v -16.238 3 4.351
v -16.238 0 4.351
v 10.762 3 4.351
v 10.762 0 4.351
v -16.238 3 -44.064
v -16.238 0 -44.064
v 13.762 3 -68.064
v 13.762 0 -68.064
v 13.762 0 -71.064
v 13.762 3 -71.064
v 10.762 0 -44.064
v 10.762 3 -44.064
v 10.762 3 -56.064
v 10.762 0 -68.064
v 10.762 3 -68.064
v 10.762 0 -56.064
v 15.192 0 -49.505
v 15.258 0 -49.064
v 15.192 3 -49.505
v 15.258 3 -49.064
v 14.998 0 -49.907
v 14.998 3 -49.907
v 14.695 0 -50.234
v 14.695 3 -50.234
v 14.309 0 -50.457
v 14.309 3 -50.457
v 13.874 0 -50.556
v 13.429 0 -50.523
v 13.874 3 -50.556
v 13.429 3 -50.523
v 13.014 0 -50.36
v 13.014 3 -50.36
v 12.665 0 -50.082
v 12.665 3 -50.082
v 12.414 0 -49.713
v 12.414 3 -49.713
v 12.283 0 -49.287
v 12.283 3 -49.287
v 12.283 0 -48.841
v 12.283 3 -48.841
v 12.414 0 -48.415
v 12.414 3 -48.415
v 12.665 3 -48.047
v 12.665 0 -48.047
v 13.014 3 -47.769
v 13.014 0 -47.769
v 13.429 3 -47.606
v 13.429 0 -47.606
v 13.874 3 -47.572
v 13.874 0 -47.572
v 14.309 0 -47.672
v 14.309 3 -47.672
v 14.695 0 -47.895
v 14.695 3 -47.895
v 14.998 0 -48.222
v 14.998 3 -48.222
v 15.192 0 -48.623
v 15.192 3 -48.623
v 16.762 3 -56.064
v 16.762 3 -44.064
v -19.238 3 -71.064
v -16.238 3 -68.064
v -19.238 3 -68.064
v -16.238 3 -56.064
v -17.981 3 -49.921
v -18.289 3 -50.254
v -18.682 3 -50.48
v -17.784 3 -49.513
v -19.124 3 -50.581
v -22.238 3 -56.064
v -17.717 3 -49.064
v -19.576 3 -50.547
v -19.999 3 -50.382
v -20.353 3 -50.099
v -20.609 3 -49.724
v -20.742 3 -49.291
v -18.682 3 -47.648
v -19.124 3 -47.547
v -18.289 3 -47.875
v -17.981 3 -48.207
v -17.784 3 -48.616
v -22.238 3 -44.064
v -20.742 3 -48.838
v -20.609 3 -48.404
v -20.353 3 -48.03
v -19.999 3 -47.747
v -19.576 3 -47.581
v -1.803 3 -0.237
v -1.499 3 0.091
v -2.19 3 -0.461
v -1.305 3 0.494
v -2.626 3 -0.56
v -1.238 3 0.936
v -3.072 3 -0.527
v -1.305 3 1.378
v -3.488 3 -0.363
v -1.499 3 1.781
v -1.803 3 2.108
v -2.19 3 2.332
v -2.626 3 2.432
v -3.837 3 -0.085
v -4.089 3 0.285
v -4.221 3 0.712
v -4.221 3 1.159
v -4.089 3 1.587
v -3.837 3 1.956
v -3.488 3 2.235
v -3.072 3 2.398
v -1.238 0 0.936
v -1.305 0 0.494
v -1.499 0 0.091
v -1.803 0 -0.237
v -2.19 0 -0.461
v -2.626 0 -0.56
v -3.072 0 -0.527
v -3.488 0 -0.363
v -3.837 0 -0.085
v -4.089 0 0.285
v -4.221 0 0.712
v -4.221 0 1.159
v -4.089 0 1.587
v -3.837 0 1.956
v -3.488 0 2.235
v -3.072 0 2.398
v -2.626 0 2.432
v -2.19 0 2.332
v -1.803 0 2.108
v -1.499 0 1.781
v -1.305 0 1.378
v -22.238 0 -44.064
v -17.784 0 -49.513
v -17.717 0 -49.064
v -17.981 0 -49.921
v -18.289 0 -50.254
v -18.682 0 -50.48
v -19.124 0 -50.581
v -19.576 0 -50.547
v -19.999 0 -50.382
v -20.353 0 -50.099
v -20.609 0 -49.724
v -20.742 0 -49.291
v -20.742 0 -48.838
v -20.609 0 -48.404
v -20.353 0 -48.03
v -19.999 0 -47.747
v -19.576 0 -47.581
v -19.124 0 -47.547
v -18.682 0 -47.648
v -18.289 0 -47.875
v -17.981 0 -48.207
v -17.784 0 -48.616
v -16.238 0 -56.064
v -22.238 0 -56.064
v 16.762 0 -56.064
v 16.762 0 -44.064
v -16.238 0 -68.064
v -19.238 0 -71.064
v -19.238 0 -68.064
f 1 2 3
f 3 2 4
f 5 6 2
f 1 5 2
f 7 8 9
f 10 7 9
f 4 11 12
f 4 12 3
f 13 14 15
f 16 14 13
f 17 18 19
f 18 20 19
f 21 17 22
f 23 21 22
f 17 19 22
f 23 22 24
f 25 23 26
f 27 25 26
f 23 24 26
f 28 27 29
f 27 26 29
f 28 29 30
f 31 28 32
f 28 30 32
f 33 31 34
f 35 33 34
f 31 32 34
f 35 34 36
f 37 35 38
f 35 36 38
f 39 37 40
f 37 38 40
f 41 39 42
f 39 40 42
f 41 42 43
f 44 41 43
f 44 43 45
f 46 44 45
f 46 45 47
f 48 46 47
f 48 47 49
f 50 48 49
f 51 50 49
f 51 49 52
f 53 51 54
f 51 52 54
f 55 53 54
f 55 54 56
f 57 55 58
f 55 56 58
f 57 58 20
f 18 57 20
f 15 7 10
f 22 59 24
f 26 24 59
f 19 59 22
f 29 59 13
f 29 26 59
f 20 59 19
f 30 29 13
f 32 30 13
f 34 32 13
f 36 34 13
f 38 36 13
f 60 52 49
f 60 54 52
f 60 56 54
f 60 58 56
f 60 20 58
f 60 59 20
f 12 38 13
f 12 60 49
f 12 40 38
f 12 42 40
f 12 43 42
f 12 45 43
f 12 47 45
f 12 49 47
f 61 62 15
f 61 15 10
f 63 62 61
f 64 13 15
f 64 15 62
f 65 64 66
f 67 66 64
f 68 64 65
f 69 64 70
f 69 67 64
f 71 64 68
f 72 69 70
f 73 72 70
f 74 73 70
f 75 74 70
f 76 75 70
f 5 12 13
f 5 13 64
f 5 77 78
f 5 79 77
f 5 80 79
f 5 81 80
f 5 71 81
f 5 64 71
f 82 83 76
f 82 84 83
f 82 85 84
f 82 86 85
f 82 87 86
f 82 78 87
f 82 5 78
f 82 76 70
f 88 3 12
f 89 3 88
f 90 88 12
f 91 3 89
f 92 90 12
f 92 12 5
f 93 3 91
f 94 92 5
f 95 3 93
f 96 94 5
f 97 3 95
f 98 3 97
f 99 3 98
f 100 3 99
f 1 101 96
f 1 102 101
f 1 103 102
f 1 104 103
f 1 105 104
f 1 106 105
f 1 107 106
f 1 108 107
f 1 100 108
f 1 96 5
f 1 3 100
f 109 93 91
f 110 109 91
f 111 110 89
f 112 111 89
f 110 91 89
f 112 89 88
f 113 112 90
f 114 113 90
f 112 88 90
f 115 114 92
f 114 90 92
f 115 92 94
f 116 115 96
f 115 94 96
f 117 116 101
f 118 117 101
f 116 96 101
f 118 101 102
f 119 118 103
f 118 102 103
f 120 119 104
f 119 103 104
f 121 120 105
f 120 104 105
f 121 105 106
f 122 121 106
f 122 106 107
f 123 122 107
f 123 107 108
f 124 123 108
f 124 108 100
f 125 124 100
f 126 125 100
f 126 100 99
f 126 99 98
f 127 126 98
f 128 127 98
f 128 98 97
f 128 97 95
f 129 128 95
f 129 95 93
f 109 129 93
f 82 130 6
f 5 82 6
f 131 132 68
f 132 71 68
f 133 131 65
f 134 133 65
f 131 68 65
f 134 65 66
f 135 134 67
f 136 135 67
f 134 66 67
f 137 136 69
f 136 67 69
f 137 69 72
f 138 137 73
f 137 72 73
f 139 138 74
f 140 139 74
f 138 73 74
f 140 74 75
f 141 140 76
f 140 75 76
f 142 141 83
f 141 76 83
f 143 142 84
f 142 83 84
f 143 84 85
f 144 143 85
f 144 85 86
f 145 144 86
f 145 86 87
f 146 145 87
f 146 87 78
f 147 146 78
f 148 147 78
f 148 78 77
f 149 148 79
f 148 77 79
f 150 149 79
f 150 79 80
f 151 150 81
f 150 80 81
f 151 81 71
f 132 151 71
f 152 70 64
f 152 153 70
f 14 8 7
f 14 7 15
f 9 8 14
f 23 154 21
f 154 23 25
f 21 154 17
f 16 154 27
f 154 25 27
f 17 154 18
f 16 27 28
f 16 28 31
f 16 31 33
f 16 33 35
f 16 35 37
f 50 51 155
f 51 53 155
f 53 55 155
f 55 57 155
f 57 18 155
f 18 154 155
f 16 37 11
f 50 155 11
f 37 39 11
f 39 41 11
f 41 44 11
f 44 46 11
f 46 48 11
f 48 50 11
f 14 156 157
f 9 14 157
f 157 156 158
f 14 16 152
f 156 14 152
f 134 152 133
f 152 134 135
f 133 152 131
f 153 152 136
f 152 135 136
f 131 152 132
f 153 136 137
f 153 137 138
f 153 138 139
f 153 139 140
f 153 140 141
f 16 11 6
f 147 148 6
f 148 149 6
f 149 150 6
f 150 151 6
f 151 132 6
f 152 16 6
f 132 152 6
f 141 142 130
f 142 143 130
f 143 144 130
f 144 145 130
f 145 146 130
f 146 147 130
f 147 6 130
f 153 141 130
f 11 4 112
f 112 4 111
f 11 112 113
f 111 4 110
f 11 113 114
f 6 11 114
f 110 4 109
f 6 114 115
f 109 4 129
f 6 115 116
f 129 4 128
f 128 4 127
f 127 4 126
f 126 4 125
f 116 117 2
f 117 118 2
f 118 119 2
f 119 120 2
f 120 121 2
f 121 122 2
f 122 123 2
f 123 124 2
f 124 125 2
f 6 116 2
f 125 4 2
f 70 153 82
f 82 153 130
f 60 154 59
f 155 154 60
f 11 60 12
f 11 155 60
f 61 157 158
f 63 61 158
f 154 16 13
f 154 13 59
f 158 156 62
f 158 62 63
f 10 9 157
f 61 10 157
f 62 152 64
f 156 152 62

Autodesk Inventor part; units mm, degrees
ref_plane "YZ Plane" through (0, 0, 0) normal (1, 0, 0) x (0, 1, 0)
ref_plane "XZ Plane" through (0, 0, 0) normal (0, 1, 0) x (-1, 0, 0)
ref_plane "XY Plane" through (0, 0, 0) normal (0, 0, 1) x (1, 0, 0)
sketch "Sketch1" plane through (0, 0, 0) normal (0, 1, 0) x (-1, 0, 0)
  line L0 (16.2379, 4.3509) -> (-10.7621, 4.3509)
  line L1 (-13.7621, -68.0643) -> (-13.7621, -71.0643)
  line L2 (-13.7621, -71.0643) -> (19.2379, -71.0643)
  line L3 (19.2379, -71.0643) -> (19.2379, -68.0643)
  line L4 (22.2379, -56.0643) -> (16.2379, -56.0643)
  line L5 (16.2379, -56.0643) -> (16.2379, -68.0643)
  line L6 (16.2379, -68.0643) -> (19.2379, -68.0643)
  line L7 (-13.7621, -68.0643) -> (-10.7621, -68.0643)
  line L8 (-10.7621, -68.0643) -> (-10.7621, -56.0643)
  line L9 (-10.7621, -56.0643) -> (-16.7621, -56.0643)
  line L10 (22.2379, -56.0643) -> (22.2379, -44.0643)
  line L11 (22.2379, -44.0643) -> (16.2379, -44.0643)
  line L12 (16.2379, -44.0643) -> (16.2379, 4.3509)
  line L13 (-16.7621, -56.0643) -> (-16.7621, -44.0643)
  line L14 (-16.7621, -44.0643) -> (-10.7621, -44.0643)
  line L15 (-10.7621, -44.0643) -> (-10.7621, 4.3509)
  dimension "d8" = 3
  dimension "d9" = 3
  dimension "d11" = 33
  dimension "d12" = 12
  dimension "d13" = 60.4152
  dimension "d14" = 12
  dimension "d24" = 6
  dimension "d25" = 6
extrude "Extrusion1" add sketch "Sketch1" along normal blind 3
sketch "Sketch5" plane through (0, 3, 0) normal (0, 1, 0) x (1, 0, 0)
  circle A0 centre (13.7621, 49.0643) radius 1.496
  circle A1 centre (-19.2379, 49.0643) radius 1.5213
  circle A2 centre (-2.7379, -0.9357) radius 1.5
  line L0 (10.7621, 44.0643) -> (16.7621, 44.0643) projected
  line L1 (16.7621, 44.0643) -> (16.7621, 56.0643) projected
  line L2 (-22.2379, 44.0643) -> (-16.2379, 44.0643) projected
  line L3 (-22.2379, 56.0643) -> (-22.2379, 44.0643) projected
  line L4 (10.7621, -4.3509) -> (10.7621, 44.0643) projected
  line L5 (-16.2379, -4.3509) -> (10.7621, -4.3509) projected
  line L6 (13.7621, 71.0643) -> (-19.2379, 71.0643) projected
  point P0 (0, 0)
  dimension "d36" = 5
  dimension "d37" = 3
  dimension "d38" = 5
  dimension "d39" = 3
  dimension "d41" = 13.5
  dimension "d42" = 3
  dimension "d46" = 72
extrude "Extrusion2" cut sketch "Sketch5" against normal through all
properties part number "k2_t_l4"
